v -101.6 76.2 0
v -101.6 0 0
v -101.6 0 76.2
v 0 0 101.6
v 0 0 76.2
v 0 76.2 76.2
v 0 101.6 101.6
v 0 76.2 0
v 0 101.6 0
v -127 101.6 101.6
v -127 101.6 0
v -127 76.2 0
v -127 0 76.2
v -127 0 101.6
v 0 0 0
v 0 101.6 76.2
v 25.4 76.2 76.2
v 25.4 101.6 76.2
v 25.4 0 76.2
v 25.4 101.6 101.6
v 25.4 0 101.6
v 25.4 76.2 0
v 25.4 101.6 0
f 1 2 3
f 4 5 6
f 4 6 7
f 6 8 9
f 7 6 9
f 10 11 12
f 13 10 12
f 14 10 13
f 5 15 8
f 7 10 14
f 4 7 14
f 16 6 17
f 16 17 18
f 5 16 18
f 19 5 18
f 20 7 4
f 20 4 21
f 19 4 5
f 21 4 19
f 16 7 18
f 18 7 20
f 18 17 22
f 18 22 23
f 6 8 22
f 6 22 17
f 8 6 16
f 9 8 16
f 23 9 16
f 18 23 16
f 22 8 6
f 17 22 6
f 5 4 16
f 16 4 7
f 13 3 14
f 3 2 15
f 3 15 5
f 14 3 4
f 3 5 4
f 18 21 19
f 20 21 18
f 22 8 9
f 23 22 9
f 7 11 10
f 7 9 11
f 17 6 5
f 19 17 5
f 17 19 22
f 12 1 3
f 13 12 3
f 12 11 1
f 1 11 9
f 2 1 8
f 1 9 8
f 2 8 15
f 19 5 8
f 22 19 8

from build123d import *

# Parameters (mm, degrees)
F0_W      = 101.6
F0_H      = 101.6
F1_DEPTH  = 101.6
F2_W      = 25.4
F2_H      = 101.6
F3_DEPTH  = 25.4
F4_W      = 25.4
F4_H      = 76.2
F5_DEPTH  = 25.4
F7_DEPTH  = 25.4
F8_W      = 25.4
F8_H      = 101.6
F9_DEPTH  = 25.4
F10_W     = 76.2
F10_H     = 25.4
F11_DEPTH = 25.4
F13_DEPTH = 25.4


with BuildPart() as f1:
    # F0 (on Top) → F1 (new body)
    with BuildSketch(Plane.XY):
        with Locations((-50.8, 50.8)):
            Rectangle(F0_W, F0_H)
    extrude(amount=F1_DEPTH)

    # F6 (on face) → F7 (join)
    with BuildSketch(Plane.YZ):
        Polygon((0, 76.2), (76.2, 0), (76.2, 76.2), align=None)
    extrude(amount=F7_DEPTH)

    # F8 (on face) → F9 (join)
    with BuildSketch(Plane(origin=(-101.6, 0, 0), x_dir=(0, -1, 0), z_dir=(-1, 0, 0))):
        with Locations((-88.9, 50.8)):
            Rectangle(F8_W, F8_H)
    extrude(amount=F9_DEPTH)

    # F10 (on face) → F11 (join)
    with BuildSketch(Plane(origin=(-101.6, 0, 0), x_dir=(0, -1, 0), z_dir=(-1, 0, 0))):
        with Locations((-38.1, 88.9)):
            Rectangle(F10_W, F10_H)
    extrude(amount=F11_DEPTH)

    # F12 (on face) → F13 (join)
    with BuildSketch(Plane(origin=(-101.6, 0, 0), x_dir=(0, -1, 0), z_dir=(-1, 0, 0))):
        Polygon((0, 76.2), (-76.2, 76.2), (-76.2, 0), align=None)
    extrude(amount=F13_DEPTH)


with BuildPart() as f3:
    # F2 (on face) → F3 (new body)
    with BuildSketch(Plane.XY.offset(101.6)):
        with Locations((12.7, 50.8)):
            Rectangle(F2_W, F2_H)
    extrude(amount=-F3_DEPTH)


with BuildPart() as f5:
    # F4 (on face) → F5 (new body)
    with BuildSketch(Plane.YZ):
        with Locations((88.9, 38.1)):
            Rectangle(F4_W, F4_H)
    extrude(amount=F5_DEPTH)


solid = Compound([f1.part, f3.part, f5.part])
